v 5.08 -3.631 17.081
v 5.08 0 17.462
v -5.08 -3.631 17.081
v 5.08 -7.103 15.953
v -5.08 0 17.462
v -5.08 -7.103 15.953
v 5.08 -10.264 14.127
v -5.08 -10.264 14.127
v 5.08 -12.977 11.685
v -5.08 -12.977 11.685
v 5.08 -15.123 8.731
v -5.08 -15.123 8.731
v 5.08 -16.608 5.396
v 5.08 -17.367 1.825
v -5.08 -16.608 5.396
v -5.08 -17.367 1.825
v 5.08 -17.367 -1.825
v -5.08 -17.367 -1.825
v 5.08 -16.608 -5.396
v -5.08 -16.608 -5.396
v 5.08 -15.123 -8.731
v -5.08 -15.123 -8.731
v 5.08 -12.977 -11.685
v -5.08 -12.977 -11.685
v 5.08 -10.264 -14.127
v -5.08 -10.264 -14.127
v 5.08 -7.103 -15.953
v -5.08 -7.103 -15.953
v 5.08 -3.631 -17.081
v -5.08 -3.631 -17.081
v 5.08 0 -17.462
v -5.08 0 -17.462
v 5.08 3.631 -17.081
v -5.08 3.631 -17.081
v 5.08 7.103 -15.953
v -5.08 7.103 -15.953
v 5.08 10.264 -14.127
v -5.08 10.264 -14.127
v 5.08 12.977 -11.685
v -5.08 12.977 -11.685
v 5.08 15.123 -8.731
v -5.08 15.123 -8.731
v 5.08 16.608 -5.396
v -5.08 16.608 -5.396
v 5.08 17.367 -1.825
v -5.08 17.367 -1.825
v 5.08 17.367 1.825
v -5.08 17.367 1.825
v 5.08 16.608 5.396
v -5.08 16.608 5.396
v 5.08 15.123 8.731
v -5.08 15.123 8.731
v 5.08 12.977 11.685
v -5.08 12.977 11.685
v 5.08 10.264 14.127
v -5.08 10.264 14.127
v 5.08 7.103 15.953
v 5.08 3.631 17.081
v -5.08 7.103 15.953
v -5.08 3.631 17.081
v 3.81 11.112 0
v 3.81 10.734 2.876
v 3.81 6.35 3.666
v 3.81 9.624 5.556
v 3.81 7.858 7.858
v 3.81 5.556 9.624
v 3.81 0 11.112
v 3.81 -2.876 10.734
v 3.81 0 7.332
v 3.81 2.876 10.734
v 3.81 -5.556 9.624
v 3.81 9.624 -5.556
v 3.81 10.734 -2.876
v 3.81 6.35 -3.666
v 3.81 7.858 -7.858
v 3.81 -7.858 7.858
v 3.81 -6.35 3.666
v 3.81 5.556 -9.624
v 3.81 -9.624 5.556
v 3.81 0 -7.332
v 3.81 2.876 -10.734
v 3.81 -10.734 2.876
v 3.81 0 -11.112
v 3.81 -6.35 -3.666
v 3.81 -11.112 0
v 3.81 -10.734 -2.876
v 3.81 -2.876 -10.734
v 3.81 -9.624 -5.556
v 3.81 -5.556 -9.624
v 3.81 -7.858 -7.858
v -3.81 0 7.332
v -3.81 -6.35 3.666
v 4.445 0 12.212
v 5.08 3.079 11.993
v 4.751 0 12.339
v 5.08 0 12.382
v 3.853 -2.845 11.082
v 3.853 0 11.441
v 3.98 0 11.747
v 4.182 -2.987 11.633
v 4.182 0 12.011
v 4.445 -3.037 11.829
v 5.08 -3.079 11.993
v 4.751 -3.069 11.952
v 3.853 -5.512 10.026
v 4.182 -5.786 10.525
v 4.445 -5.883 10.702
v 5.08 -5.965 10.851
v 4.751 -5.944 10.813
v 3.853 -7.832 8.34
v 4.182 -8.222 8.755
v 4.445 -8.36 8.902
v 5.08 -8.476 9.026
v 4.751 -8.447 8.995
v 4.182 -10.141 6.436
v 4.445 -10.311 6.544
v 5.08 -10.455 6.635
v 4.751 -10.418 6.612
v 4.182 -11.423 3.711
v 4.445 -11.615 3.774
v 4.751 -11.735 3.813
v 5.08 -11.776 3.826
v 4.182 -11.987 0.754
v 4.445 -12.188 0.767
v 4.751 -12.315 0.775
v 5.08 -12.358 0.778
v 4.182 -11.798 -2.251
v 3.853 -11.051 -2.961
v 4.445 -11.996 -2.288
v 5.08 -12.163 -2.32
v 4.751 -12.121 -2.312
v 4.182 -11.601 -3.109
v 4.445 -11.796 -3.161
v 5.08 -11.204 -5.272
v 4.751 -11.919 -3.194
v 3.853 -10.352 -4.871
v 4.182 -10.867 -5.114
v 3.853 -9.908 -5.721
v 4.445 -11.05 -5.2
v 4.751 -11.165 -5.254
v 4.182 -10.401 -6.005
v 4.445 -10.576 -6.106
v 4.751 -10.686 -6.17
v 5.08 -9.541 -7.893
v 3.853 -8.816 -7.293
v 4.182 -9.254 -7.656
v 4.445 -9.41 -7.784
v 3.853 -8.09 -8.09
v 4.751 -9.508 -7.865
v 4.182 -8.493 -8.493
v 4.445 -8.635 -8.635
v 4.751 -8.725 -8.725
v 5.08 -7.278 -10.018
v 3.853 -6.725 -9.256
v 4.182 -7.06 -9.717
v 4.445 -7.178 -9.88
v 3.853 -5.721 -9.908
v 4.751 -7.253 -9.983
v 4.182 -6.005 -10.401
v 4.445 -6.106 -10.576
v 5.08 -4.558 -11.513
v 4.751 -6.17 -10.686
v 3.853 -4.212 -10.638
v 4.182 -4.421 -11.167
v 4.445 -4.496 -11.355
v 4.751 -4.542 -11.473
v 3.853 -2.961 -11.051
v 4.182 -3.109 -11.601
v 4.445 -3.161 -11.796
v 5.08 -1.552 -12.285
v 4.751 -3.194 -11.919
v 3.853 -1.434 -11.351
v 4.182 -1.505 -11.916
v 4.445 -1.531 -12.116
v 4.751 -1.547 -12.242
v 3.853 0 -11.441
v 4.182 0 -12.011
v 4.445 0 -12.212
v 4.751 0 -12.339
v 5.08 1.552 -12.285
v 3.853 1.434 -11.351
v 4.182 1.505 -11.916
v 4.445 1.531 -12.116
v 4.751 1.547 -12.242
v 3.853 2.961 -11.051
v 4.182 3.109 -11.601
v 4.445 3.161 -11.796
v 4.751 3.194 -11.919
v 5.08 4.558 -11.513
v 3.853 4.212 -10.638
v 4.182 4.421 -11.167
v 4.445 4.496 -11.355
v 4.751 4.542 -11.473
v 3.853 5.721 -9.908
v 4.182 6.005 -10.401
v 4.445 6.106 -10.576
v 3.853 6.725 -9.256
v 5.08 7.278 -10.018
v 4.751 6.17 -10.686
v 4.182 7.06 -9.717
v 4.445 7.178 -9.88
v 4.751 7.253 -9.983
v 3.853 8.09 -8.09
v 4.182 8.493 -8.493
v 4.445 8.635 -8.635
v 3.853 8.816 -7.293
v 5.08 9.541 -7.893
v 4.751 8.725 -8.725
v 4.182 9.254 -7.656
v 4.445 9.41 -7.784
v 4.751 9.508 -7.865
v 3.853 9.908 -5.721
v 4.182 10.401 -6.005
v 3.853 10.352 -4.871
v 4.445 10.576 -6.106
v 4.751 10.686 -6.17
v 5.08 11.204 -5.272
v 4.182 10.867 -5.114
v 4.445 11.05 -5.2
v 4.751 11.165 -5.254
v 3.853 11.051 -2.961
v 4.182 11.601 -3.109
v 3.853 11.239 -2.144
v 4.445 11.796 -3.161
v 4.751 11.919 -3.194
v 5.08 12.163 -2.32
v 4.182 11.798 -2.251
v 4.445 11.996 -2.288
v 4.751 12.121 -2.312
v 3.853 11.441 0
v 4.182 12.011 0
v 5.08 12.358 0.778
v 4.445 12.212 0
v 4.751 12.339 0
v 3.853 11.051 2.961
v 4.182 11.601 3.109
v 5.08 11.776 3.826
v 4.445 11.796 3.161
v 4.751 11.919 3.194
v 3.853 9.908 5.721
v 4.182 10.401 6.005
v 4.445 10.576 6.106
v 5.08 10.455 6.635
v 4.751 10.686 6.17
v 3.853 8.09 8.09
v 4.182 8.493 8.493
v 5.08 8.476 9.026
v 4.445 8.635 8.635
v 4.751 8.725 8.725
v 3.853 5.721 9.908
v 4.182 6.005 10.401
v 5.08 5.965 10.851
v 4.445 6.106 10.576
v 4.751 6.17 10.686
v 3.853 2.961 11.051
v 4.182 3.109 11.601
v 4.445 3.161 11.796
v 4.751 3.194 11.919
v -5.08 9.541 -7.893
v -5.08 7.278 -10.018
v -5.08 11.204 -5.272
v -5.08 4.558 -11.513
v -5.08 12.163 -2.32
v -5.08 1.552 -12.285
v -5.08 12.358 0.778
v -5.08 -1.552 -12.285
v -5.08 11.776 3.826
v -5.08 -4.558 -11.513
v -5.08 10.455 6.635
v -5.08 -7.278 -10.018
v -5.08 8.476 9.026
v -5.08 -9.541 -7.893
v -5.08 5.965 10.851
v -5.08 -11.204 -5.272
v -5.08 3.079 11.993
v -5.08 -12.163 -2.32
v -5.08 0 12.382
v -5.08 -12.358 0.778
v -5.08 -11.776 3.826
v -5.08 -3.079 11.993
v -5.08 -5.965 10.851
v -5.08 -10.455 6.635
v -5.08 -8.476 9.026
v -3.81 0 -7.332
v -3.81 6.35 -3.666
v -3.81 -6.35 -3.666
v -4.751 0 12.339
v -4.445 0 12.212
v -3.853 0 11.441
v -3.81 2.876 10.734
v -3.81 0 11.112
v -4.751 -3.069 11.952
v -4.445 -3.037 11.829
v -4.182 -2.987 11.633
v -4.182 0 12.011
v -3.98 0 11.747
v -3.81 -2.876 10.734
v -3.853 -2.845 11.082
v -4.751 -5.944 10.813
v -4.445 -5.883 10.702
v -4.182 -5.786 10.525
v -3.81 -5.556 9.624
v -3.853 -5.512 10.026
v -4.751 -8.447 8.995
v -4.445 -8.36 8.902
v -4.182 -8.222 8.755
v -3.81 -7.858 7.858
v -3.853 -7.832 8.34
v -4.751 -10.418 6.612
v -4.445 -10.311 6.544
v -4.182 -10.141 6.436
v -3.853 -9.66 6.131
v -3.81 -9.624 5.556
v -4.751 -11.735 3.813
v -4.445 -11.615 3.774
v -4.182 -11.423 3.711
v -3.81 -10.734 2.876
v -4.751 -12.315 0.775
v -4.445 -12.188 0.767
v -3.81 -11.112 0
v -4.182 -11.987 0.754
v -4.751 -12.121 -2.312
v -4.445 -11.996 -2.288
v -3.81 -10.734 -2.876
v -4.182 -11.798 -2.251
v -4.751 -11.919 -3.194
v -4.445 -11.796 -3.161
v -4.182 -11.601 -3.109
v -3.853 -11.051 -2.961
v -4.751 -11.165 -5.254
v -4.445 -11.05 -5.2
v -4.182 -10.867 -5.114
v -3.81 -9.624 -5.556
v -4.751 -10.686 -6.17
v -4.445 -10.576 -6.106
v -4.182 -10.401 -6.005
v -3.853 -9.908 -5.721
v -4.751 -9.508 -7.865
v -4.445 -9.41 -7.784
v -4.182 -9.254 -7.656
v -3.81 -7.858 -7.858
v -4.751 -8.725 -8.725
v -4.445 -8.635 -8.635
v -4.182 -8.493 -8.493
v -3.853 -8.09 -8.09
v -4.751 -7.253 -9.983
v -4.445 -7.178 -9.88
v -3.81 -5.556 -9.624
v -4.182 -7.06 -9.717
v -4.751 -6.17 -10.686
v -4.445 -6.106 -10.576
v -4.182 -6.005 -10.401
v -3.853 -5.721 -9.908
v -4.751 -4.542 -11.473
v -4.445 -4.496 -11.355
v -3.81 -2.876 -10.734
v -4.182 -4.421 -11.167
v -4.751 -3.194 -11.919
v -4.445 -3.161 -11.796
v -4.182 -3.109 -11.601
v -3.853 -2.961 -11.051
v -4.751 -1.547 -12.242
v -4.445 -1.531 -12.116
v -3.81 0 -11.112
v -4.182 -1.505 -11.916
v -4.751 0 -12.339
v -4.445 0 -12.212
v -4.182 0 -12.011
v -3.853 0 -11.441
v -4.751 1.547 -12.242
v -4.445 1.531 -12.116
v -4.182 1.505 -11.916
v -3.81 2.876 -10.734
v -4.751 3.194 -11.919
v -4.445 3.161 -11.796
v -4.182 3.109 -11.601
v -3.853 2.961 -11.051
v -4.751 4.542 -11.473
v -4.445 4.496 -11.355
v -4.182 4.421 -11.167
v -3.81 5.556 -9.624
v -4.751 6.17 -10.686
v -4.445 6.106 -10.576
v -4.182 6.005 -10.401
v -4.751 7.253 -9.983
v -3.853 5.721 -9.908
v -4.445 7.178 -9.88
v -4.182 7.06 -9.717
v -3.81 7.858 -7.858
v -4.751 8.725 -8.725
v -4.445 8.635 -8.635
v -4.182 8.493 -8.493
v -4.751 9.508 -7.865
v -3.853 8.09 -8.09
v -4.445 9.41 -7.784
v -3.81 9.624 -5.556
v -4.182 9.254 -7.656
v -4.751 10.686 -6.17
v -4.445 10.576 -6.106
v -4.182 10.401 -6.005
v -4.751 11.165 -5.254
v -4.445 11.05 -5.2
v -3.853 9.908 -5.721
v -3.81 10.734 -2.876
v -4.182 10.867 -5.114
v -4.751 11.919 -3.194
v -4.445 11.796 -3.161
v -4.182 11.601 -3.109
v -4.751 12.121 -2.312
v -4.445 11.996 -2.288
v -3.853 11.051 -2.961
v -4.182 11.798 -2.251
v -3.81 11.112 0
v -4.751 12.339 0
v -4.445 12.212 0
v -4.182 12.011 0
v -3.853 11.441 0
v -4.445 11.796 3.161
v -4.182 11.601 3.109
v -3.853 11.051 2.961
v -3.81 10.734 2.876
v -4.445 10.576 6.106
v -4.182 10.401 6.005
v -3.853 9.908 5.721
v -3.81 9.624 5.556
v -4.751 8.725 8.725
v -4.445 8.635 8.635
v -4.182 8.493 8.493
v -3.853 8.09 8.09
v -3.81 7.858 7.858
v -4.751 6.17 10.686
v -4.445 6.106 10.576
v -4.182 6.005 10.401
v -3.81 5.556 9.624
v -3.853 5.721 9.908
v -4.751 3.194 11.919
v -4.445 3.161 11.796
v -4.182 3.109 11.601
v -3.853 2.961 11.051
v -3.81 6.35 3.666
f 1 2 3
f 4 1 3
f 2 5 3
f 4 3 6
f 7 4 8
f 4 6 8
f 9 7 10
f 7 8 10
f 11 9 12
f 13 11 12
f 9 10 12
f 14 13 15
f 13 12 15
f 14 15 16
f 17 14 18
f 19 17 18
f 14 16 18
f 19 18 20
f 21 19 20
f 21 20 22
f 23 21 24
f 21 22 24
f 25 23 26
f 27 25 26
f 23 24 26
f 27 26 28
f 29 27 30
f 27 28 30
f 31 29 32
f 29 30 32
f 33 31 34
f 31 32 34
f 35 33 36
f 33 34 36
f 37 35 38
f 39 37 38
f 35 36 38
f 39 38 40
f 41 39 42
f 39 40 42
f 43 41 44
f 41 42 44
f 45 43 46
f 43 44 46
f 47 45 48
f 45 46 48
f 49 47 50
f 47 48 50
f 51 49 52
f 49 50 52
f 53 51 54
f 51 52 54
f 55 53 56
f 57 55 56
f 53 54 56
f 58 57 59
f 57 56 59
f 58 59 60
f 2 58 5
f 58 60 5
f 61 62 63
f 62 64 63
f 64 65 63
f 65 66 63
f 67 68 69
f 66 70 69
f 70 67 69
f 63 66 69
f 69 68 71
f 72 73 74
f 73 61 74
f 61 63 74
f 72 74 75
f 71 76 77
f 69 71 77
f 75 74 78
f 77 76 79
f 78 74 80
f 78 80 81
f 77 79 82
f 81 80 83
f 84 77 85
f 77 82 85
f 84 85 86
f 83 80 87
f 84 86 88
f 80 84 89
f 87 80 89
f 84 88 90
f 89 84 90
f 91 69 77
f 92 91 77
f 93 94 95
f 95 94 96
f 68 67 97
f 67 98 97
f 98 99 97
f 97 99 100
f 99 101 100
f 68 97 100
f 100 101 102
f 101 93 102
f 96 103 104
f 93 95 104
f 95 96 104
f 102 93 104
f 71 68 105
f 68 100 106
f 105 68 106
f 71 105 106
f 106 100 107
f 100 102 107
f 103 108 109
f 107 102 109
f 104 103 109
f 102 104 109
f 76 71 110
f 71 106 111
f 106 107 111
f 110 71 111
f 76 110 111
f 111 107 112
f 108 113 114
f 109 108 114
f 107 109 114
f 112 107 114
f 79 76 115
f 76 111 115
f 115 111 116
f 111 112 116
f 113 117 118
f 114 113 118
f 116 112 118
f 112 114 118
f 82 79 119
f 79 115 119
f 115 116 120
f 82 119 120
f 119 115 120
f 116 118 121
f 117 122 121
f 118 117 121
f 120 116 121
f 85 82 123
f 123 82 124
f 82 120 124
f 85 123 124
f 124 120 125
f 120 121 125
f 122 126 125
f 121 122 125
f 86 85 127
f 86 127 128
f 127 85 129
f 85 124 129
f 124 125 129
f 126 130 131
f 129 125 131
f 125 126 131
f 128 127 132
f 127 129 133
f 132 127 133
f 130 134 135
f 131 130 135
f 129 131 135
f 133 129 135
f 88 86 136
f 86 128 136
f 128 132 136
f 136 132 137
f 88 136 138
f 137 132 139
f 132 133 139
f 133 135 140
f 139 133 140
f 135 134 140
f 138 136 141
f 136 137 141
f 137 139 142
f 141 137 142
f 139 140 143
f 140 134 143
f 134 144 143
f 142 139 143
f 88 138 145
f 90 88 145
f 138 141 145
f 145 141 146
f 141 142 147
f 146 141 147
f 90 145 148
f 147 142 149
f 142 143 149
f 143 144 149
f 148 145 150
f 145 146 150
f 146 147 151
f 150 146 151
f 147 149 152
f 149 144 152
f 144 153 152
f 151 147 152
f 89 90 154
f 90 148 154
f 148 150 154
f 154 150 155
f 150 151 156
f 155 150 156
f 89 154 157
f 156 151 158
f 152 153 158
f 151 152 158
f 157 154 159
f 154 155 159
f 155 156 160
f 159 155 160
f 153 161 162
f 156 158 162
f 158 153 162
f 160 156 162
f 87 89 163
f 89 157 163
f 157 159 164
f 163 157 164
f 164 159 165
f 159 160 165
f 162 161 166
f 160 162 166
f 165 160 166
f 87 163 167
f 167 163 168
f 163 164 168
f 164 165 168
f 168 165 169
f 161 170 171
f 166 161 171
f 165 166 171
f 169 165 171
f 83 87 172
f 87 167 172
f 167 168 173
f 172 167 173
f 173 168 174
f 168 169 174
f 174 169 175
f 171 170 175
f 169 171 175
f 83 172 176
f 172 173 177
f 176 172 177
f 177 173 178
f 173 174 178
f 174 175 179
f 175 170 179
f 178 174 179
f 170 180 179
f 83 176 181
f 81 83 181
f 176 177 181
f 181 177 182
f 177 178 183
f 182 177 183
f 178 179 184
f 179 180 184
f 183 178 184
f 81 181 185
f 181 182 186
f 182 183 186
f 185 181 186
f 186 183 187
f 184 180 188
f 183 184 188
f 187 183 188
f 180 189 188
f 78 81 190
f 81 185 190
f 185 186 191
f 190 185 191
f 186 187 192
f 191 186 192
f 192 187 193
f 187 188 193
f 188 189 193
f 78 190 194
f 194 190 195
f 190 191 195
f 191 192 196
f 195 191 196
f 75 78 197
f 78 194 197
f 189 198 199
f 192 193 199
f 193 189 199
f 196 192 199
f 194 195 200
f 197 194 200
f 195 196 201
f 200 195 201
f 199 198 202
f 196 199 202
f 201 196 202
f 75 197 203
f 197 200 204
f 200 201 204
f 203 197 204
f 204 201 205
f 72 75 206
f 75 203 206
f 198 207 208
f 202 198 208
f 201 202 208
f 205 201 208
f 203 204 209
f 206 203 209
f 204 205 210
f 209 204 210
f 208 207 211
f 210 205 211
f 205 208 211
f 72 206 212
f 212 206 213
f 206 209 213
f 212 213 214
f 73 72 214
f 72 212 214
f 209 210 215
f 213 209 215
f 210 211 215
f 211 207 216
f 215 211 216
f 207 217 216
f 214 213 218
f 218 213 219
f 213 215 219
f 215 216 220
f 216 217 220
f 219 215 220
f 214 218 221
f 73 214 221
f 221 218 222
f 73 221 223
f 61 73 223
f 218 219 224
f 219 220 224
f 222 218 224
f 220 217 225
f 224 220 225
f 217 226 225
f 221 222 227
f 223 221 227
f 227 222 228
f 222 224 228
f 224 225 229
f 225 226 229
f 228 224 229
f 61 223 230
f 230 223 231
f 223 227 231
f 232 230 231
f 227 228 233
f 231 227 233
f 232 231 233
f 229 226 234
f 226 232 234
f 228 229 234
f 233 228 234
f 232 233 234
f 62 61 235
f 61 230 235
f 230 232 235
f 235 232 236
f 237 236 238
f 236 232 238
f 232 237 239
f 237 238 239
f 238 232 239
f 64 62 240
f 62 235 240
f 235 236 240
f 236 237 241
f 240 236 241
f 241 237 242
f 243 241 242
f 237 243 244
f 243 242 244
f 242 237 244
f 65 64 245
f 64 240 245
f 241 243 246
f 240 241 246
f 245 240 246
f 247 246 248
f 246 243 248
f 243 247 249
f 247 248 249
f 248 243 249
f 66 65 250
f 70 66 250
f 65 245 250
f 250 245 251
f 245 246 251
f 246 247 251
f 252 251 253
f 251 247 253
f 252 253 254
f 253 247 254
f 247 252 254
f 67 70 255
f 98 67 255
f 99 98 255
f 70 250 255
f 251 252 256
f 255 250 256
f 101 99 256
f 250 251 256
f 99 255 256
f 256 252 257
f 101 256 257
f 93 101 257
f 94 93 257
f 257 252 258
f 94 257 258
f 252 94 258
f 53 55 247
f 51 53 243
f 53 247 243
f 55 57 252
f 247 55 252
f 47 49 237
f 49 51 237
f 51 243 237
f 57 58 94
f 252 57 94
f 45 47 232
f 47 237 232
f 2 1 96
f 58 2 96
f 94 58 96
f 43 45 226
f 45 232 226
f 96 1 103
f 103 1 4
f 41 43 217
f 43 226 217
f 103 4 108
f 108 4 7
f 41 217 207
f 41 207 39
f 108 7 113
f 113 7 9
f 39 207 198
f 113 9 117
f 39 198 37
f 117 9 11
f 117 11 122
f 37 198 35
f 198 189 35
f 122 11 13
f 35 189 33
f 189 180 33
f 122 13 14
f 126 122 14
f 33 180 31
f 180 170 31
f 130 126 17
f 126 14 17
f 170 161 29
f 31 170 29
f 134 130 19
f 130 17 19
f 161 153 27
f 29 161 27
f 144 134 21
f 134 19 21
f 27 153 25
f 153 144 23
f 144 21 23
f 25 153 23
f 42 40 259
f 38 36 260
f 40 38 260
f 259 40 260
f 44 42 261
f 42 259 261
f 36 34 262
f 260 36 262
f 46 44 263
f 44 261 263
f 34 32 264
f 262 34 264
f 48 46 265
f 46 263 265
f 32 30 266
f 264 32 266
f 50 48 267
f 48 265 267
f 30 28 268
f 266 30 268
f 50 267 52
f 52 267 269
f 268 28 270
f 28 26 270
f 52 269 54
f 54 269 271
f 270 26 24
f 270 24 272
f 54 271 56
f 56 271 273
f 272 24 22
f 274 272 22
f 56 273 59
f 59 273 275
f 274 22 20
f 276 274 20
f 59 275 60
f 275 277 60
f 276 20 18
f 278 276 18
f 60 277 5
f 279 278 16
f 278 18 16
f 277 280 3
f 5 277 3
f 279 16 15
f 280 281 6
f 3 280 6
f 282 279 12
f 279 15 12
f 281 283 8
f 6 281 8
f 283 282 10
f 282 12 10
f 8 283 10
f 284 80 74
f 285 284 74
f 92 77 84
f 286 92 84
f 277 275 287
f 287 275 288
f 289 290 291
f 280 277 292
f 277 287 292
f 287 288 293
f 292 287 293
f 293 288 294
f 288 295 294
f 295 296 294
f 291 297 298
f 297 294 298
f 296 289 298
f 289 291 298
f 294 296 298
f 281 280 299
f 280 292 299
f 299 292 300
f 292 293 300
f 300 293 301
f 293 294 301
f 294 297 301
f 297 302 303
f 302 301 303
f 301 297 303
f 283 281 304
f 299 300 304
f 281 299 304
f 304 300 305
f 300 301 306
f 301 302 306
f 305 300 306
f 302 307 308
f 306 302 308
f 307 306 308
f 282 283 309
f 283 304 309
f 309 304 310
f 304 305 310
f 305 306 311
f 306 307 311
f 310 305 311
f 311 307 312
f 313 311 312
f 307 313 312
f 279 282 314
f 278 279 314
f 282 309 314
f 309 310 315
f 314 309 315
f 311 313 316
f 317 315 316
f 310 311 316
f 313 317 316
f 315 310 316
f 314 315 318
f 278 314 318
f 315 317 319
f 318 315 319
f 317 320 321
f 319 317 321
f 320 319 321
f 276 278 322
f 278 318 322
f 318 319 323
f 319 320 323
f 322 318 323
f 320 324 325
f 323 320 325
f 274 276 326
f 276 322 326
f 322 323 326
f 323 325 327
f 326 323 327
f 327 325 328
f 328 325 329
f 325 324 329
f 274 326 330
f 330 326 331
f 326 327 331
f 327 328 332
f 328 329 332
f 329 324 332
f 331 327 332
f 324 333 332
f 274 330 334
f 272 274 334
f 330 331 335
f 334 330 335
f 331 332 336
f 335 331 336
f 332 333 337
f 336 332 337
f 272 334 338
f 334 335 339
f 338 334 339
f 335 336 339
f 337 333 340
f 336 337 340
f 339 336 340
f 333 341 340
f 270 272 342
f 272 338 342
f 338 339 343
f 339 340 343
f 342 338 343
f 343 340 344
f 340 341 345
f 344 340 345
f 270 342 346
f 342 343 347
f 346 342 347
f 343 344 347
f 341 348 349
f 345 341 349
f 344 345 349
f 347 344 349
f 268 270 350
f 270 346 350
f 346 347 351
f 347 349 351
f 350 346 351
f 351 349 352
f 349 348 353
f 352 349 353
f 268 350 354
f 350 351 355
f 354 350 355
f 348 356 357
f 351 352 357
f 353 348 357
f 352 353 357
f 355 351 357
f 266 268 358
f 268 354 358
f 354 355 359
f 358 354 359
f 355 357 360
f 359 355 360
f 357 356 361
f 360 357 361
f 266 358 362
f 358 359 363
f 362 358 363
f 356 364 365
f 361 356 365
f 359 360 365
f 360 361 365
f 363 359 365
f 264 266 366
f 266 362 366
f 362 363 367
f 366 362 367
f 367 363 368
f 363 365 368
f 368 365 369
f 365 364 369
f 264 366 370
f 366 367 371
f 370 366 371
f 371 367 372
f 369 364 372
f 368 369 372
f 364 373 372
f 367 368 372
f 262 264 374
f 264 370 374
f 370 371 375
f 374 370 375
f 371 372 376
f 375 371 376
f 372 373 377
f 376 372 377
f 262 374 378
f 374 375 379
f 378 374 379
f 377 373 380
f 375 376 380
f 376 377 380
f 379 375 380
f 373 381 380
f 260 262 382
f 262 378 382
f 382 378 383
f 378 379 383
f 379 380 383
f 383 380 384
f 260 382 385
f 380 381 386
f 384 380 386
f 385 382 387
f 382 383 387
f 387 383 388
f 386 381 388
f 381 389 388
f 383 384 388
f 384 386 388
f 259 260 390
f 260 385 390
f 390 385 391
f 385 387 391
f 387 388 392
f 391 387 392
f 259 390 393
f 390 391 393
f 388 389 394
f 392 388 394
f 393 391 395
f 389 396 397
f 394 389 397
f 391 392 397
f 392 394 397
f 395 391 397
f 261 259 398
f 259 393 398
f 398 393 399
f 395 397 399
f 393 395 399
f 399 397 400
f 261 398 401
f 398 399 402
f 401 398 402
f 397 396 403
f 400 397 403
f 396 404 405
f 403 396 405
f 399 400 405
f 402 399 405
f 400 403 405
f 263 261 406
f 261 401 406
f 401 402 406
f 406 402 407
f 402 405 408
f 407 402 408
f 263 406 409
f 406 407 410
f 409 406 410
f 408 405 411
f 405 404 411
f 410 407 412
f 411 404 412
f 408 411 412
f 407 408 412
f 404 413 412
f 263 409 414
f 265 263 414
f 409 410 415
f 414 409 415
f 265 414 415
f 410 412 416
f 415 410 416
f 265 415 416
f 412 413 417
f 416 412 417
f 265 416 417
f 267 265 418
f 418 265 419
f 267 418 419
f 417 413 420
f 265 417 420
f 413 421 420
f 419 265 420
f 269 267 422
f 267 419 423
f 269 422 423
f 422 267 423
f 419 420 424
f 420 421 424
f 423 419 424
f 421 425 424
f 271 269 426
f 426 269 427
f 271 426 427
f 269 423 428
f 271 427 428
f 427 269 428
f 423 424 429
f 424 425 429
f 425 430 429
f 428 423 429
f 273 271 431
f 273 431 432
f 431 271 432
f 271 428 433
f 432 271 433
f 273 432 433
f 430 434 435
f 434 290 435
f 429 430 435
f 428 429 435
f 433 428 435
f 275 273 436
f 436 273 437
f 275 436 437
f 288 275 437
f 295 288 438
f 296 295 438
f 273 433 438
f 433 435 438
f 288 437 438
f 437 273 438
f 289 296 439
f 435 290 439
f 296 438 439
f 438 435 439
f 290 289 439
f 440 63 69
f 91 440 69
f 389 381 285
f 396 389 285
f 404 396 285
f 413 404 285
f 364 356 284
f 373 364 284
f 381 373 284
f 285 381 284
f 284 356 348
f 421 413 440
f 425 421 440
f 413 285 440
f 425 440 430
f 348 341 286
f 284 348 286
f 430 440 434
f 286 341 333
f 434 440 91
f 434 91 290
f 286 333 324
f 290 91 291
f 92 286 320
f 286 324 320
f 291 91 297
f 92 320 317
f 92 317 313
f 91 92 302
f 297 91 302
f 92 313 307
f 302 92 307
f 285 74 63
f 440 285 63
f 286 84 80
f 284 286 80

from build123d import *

# Parameters (mm, degrees)
CUT_EXTRUDE1_REACH = 28.247


with BuildPart() as part:
    # Sketch2 → Revolve1 (revolve)
    with BuildSketch(Plane.XY, mode=Mode.PRIVATE) as revolve1_sk:
        with BuildLine():
            Line((-5.08, 17.4625), (-5.08, 12.3825))
            ThreePointArc((-5.08, 12.3825), (-4.181974388, 12.010525612), (-3.81, 11.1125))
            Line((-3.81, 11.1125), (-3.81, 0))
            Line((-3.81, 0), (3.81, 0))
            Line((3.81, 0), (3.81, 11.1125))
            ThreePointArc((3.81, 11.1125), (4.181974388, 12.010525612), (5.08, 12.3825))
            Line((5.08, 12.3825), (5.08, 17.4625))
            Line((5.08, 17.4625), (-5.08, 17.4625))
        make_face()
    revolve(revolve1_sk.sketch.rotate(Axis((-6.869429095, 0, 0), (1, 0, 0)), 90), axis=Axis((-6.869429095, 0, 0), (1, 0, 0)))

    # Sketch3 → Cut-Extrude1 (cut, up to next)
    with BuildSketch(Plane(origin=(3.81, 0, 0), x_dir=(0, 0, -1), z_dir=(1, 0, 0)), mode=Mode.PRIVATE) as cut_extrude1_sk1:
        Polygon((7.332348419, 0), (3.666174209, 6.35), (-3.666174209, 6.35), (-7.332348419, 0), (-3.666174209, -6.35), (3.666174209, -6.35), align=None)
    cut_extrude1_tool1 = extrude(cut_extrude1_sk1.sketch, amount=-CUT_EXTRUDE1_REACH, mode=Mode.PRIVATE) & part.part
    add(cut_extrude1_tool1.solids().sort_by_distance((3.81, 0, 0))[0], mode=Mode.SUBTRACT)


solid = part.part
